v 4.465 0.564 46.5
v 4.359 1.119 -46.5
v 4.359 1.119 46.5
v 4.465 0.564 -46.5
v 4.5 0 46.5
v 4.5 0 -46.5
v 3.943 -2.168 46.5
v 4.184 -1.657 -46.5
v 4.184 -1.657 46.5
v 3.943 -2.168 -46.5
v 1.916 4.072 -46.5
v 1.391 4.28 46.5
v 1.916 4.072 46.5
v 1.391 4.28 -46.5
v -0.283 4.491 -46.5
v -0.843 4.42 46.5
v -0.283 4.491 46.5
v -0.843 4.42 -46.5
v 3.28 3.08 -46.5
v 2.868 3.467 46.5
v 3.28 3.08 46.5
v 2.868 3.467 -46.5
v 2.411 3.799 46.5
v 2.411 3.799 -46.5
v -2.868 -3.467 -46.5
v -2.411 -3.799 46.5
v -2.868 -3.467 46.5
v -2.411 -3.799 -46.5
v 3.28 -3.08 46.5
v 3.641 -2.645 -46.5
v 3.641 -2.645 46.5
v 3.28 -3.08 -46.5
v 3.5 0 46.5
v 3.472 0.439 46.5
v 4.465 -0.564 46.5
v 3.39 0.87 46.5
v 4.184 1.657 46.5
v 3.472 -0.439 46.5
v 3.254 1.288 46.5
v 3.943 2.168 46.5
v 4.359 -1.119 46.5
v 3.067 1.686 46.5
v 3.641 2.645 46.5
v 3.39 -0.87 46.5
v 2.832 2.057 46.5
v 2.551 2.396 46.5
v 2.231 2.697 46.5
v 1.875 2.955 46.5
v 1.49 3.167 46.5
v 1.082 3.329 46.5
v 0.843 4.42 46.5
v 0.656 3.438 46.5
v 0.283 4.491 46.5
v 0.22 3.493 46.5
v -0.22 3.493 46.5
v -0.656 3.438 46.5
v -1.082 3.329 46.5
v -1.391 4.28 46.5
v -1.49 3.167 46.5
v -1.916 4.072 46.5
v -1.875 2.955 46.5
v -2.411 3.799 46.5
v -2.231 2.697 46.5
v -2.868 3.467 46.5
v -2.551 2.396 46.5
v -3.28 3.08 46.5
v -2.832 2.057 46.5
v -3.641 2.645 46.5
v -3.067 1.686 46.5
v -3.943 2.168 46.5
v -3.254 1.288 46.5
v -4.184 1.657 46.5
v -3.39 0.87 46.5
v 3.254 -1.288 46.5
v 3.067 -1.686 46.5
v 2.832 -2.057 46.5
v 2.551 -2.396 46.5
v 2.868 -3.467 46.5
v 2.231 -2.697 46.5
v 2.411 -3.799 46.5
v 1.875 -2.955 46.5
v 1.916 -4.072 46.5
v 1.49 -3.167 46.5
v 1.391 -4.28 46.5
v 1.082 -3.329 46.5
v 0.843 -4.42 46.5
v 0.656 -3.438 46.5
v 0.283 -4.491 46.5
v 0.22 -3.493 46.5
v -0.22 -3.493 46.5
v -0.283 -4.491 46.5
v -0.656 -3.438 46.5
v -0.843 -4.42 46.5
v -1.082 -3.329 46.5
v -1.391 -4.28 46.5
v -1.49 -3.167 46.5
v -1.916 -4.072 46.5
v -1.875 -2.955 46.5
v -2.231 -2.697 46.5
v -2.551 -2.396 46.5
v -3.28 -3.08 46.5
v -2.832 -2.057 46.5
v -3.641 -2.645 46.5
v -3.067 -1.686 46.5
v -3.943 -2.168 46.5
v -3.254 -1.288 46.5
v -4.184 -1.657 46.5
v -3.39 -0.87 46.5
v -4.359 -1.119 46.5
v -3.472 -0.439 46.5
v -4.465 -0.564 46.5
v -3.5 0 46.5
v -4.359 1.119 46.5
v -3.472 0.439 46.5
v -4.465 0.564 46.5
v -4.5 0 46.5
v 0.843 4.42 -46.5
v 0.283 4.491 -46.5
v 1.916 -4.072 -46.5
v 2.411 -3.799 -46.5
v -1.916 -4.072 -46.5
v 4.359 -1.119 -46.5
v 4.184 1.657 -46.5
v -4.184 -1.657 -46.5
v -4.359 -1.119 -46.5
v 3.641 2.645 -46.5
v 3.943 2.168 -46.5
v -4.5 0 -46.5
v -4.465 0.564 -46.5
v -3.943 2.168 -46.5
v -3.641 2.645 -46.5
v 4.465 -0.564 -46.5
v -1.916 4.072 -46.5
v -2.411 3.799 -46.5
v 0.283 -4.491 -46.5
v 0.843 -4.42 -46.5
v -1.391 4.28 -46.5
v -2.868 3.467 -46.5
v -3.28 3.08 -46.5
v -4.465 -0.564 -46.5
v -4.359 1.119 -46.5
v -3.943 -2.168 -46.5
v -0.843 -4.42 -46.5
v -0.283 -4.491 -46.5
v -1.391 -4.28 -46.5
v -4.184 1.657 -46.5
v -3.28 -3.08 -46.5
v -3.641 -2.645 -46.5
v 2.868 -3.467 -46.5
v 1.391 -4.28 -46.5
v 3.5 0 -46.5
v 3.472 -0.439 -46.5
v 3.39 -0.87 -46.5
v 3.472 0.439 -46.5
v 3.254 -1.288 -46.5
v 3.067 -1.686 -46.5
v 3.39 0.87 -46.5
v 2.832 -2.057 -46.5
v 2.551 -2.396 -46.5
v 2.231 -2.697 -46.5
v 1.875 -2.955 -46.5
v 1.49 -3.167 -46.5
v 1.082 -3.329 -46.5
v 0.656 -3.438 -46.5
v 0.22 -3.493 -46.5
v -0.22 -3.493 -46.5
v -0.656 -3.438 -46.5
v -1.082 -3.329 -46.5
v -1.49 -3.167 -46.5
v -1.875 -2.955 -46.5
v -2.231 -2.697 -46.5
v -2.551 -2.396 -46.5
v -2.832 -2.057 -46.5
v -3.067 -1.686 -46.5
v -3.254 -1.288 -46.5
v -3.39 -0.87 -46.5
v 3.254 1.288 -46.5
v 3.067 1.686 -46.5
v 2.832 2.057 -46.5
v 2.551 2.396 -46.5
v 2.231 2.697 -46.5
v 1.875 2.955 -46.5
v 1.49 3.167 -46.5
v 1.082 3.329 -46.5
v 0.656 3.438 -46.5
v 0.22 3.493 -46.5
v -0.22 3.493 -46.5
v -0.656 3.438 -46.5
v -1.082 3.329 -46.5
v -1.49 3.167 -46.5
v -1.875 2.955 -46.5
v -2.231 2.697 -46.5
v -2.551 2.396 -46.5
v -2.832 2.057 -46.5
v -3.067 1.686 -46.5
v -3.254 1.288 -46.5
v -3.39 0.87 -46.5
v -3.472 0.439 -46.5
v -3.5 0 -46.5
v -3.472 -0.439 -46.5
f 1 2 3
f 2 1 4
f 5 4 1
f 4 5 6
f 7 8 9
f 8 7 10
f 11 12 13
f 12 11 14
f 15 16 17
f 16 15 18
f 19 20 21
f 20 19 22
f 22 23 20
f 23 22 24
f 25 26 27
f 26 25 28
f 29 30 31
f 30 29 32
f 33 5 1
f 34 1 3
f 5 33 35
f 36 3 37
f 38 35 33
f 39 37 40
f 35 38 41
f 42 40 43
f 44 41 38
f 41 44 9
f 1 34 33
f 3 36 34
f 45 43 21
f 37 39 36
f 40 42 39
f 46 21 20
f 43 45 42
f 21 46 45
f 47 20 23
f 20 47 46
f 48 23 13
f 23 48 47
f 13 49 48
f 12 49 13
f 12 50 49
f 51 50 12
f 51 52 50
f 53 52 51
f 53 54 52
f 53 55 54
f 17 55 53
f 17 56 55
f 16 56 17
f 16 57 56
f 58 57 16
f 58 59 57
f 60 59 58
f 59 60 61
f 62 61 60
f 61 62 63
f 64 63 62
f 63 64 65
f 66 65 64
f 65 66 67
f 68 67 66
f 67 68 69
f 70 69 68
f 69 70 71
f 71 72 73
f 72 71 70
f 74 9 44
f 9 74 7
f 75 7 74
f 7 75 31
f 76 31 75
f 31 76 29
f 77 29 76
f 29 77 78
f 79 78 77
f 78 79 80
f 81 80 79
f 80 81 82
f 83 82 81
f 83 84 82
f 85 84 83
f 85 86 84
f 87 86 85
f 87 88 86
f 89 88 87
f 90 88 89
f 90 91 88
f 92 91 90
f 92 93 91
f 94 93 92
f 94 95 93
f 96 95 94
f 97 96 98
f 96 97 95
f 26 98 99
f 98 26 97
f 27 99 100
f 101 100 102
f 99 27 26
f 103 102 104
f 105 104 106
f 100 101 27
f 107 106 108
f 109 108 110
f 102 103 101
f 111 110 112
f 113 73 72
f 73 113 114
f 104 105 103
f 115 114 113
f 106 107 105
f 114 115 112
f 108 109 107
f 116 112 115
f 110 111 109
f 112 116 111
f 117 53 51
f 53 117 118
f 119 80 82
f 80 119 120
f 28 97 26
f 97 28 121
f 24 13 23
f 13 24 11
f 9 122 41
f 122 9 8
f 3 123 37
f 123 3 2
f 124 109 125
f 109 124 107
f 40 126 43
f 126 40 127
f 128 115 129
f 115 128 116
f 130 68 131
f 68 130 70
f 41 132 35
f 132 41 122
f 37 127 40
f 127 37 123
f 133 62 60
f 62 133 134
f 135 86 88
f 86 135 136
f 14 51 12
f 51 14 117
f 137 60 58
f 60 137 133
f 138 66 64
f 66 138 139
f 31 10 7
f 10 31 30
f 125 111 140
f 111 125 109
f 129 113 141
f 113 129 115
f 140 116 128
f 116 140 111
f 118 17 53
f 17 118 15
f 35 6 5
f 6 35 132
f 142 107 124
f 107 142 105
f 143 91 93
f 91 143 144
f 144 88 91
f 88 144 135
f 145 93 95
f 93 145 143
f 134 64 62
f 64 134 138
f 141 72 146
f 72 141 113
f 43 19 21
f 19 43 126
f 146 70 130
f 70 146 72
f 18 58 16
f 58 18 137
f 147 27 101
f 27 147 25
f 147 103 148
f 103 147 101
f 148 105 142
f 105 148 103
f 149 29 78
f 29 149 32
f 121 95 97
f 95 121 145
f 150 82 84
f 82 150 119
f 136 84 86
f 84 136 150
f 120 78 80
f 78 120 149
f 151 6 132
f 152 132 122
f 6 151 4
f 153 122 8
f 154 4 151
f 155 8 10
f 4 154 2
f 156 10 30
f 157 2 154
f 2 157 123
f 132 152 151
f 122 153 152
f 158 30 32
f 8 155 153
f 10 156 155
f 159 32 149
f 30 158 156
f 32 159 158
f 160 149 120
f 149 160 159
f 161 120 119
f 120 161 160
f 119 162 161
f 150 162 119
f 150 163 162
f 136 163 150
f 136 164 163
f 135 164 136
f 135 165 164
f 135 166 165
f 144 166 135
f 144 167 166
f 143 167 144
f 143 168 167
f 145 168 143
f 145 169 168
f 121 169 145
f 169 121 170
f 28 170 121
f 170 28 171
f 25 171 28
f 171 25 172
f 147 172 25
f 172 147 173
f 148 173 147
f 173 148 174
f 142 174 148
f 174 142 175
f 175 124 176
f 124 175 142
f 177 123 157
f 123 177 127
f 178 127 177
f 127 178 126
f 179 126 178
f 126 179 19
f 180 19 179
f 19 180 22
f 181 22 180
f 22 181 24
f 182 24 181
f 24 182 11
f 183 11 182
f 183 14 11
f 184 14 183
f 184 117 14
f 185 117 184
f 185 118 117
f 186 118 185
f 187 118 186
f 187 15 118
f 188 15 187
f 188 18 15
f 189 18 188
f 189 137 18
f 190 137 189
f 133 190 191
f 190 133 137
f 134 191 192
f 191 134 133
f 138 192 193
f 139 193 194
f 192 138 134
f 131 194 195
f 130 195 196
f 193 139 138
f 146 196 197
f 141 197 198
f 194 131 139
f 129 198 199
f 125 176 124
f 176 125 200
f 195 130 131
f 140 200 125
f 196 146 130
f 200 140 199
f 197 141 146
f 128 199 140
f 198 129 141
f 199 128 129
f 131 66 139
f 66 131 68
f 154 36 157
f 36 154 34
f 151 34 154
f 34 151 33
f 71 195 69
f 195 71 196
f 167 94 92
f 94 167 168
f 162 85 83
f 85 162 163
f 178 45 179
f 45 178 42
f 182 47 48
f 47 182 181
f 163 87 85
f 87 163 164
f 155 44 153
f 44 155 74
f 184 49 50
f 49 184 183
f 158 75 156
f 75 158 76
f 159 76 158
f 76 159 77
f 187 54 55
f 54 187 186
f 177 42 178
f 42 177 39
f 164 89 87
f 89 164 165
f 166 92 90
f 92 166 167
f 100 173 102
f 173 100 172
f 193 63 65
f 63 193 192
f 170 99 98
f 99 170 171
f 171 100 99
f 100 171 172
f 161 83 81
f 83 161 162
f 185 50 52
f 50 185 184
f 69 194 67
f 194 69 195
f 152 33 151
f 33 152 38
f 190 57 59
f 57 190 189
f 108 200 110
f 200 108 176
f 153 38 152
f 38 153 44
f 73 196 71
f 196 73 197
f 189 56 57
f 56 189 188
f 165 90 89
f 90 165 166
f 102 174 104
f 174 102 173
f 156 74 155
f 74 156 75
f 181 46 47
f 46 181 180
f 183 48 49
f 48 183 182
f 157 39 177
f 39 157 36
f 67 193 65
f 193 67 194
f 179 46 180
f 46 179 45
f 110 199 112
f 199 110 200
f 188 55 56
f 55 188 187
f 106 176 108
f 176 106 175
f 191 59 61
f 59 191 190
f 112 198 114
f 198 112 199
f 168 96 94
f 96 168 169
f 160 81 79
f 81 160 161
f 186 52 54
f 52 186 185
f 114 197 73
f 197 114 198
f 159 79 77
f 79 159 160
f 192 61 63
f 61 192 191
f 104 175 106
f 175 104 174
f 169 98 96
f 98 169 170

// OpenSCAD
$fn = 50;


difference() {
	union() {
		translate(v = [0, 0, -46.5000000000]) {
			cylinder(h = 93, r = 4.5000000000);
		}
	}
	union() {
		translate(v = [0, 0, -100.0000000000]) {
			cylinder(h = 200, r = 3.5000000000);
		}
	}
}
